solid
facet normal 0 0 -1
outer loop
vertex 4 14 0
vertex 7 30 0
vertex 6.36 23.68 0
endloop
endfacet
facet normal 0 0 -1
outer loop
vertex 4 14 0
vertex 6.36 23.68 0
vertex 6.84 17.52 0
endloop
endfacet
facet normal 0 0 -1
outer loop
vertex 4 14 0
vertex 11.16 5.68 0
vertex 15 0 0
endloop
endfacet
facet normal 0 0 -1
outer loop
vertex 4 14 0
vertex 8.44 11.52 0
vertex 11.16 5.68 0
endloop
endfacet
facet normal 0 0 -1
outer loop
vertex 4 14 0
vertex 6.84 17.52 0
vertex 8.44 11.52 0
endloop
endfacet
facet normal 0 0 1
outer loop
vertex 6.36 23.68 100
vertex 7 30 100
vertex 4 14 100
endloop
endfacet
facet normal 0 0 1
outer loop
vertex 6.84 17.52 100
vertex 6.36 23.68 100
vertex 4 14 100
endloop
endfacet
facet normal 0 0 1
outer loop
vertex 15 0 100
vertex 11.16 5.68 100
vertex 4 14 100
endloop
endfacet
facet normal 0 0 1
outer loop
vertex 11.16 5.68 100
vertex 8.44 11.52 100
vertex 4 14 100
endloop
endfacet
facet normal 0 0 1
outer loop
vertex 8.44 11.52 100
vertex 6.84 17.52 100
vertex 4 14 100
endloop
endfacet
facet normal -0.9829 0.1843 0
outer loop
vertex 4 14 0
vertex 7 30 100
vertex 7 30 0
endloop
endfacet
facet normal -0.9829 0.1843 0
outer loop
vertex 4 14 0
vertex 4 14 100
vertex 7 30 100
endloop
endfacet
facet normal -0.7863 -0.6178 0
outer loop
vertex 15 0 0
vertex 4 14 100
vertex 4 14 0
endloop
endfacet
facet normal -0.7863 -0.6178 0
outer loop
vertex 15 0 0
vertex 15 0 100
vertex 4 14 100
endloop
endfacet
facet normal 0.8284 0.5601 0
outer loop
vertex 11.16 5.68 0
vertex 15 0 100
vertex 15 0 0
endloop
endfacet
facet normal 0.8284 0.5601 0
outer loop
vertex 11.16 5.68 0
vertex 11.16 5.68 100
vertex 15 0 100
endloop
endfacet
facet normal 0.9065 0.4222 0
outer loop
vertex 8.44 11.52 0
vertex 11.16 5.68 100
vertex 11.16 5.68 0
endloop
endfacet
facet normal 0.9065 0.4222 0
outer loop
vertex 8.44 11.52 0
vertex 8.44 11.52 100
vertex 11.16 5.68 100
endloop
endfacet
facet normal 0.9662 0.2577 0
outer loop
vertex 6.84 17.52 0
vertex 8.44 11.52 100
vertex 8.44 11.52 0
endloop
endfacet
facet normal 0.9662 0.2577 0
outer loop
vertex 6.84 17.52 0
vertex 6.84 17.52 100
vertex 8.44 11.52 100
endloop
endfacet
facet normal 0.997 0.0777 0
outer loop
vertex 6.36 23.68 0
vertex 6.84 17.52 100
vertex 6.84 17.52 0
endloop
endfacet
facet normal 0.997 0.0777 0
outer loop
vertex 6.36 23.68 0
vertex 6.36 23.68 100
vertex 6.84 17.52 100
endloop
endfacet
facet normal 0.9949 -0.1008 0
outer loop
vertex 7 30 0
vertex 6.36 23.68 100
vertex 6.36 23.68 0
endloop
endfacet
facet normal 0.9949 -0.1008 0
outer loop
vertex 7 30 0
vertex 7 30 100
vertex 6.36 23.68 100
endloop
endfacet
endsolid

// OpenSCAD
module BezConic(p0,p1,p2,steps=5) 
{

	stepsize1 = (p1-p0)/steps;
	stepsize2 = (p2-p1)/steps;

	for (i=[0:steps-1]) {
		assign(point1 = p0+stepsize1*i) 
		assign(point2 = p1+stepsize2*i) 
		assign(point3 = p0+stepsize1*(i+1))
		assign(point4 = p1+stepsize2*(i+1))  {
			assign( bpoint1 = point1+(point2-point1)*(i/steps) )
			assign( bpoint2 = point3+(point4-point3)*((i+1)/steps) ) {
				polygon(points=[bpoint1,bpoint2,p1]);
			}
		}
	}
}


p0=[15,0];
p1=[4,14];
p2=[7,30];
//BezConic(p0,p1,p2,20);

//translate([0,20,0]) rotate([90,0,0]) BezConic(p0,p1,p2,20);
//translate([0,20,0]) cylinder(h=30,r=0.5,$fn=10);

//linear_extrude(height=20) translate([15,0,0]) BezConic(p0,p1,p2,20);
linear_extrude($fn=100) BezConic(p0,p1,p2,steps=5);
